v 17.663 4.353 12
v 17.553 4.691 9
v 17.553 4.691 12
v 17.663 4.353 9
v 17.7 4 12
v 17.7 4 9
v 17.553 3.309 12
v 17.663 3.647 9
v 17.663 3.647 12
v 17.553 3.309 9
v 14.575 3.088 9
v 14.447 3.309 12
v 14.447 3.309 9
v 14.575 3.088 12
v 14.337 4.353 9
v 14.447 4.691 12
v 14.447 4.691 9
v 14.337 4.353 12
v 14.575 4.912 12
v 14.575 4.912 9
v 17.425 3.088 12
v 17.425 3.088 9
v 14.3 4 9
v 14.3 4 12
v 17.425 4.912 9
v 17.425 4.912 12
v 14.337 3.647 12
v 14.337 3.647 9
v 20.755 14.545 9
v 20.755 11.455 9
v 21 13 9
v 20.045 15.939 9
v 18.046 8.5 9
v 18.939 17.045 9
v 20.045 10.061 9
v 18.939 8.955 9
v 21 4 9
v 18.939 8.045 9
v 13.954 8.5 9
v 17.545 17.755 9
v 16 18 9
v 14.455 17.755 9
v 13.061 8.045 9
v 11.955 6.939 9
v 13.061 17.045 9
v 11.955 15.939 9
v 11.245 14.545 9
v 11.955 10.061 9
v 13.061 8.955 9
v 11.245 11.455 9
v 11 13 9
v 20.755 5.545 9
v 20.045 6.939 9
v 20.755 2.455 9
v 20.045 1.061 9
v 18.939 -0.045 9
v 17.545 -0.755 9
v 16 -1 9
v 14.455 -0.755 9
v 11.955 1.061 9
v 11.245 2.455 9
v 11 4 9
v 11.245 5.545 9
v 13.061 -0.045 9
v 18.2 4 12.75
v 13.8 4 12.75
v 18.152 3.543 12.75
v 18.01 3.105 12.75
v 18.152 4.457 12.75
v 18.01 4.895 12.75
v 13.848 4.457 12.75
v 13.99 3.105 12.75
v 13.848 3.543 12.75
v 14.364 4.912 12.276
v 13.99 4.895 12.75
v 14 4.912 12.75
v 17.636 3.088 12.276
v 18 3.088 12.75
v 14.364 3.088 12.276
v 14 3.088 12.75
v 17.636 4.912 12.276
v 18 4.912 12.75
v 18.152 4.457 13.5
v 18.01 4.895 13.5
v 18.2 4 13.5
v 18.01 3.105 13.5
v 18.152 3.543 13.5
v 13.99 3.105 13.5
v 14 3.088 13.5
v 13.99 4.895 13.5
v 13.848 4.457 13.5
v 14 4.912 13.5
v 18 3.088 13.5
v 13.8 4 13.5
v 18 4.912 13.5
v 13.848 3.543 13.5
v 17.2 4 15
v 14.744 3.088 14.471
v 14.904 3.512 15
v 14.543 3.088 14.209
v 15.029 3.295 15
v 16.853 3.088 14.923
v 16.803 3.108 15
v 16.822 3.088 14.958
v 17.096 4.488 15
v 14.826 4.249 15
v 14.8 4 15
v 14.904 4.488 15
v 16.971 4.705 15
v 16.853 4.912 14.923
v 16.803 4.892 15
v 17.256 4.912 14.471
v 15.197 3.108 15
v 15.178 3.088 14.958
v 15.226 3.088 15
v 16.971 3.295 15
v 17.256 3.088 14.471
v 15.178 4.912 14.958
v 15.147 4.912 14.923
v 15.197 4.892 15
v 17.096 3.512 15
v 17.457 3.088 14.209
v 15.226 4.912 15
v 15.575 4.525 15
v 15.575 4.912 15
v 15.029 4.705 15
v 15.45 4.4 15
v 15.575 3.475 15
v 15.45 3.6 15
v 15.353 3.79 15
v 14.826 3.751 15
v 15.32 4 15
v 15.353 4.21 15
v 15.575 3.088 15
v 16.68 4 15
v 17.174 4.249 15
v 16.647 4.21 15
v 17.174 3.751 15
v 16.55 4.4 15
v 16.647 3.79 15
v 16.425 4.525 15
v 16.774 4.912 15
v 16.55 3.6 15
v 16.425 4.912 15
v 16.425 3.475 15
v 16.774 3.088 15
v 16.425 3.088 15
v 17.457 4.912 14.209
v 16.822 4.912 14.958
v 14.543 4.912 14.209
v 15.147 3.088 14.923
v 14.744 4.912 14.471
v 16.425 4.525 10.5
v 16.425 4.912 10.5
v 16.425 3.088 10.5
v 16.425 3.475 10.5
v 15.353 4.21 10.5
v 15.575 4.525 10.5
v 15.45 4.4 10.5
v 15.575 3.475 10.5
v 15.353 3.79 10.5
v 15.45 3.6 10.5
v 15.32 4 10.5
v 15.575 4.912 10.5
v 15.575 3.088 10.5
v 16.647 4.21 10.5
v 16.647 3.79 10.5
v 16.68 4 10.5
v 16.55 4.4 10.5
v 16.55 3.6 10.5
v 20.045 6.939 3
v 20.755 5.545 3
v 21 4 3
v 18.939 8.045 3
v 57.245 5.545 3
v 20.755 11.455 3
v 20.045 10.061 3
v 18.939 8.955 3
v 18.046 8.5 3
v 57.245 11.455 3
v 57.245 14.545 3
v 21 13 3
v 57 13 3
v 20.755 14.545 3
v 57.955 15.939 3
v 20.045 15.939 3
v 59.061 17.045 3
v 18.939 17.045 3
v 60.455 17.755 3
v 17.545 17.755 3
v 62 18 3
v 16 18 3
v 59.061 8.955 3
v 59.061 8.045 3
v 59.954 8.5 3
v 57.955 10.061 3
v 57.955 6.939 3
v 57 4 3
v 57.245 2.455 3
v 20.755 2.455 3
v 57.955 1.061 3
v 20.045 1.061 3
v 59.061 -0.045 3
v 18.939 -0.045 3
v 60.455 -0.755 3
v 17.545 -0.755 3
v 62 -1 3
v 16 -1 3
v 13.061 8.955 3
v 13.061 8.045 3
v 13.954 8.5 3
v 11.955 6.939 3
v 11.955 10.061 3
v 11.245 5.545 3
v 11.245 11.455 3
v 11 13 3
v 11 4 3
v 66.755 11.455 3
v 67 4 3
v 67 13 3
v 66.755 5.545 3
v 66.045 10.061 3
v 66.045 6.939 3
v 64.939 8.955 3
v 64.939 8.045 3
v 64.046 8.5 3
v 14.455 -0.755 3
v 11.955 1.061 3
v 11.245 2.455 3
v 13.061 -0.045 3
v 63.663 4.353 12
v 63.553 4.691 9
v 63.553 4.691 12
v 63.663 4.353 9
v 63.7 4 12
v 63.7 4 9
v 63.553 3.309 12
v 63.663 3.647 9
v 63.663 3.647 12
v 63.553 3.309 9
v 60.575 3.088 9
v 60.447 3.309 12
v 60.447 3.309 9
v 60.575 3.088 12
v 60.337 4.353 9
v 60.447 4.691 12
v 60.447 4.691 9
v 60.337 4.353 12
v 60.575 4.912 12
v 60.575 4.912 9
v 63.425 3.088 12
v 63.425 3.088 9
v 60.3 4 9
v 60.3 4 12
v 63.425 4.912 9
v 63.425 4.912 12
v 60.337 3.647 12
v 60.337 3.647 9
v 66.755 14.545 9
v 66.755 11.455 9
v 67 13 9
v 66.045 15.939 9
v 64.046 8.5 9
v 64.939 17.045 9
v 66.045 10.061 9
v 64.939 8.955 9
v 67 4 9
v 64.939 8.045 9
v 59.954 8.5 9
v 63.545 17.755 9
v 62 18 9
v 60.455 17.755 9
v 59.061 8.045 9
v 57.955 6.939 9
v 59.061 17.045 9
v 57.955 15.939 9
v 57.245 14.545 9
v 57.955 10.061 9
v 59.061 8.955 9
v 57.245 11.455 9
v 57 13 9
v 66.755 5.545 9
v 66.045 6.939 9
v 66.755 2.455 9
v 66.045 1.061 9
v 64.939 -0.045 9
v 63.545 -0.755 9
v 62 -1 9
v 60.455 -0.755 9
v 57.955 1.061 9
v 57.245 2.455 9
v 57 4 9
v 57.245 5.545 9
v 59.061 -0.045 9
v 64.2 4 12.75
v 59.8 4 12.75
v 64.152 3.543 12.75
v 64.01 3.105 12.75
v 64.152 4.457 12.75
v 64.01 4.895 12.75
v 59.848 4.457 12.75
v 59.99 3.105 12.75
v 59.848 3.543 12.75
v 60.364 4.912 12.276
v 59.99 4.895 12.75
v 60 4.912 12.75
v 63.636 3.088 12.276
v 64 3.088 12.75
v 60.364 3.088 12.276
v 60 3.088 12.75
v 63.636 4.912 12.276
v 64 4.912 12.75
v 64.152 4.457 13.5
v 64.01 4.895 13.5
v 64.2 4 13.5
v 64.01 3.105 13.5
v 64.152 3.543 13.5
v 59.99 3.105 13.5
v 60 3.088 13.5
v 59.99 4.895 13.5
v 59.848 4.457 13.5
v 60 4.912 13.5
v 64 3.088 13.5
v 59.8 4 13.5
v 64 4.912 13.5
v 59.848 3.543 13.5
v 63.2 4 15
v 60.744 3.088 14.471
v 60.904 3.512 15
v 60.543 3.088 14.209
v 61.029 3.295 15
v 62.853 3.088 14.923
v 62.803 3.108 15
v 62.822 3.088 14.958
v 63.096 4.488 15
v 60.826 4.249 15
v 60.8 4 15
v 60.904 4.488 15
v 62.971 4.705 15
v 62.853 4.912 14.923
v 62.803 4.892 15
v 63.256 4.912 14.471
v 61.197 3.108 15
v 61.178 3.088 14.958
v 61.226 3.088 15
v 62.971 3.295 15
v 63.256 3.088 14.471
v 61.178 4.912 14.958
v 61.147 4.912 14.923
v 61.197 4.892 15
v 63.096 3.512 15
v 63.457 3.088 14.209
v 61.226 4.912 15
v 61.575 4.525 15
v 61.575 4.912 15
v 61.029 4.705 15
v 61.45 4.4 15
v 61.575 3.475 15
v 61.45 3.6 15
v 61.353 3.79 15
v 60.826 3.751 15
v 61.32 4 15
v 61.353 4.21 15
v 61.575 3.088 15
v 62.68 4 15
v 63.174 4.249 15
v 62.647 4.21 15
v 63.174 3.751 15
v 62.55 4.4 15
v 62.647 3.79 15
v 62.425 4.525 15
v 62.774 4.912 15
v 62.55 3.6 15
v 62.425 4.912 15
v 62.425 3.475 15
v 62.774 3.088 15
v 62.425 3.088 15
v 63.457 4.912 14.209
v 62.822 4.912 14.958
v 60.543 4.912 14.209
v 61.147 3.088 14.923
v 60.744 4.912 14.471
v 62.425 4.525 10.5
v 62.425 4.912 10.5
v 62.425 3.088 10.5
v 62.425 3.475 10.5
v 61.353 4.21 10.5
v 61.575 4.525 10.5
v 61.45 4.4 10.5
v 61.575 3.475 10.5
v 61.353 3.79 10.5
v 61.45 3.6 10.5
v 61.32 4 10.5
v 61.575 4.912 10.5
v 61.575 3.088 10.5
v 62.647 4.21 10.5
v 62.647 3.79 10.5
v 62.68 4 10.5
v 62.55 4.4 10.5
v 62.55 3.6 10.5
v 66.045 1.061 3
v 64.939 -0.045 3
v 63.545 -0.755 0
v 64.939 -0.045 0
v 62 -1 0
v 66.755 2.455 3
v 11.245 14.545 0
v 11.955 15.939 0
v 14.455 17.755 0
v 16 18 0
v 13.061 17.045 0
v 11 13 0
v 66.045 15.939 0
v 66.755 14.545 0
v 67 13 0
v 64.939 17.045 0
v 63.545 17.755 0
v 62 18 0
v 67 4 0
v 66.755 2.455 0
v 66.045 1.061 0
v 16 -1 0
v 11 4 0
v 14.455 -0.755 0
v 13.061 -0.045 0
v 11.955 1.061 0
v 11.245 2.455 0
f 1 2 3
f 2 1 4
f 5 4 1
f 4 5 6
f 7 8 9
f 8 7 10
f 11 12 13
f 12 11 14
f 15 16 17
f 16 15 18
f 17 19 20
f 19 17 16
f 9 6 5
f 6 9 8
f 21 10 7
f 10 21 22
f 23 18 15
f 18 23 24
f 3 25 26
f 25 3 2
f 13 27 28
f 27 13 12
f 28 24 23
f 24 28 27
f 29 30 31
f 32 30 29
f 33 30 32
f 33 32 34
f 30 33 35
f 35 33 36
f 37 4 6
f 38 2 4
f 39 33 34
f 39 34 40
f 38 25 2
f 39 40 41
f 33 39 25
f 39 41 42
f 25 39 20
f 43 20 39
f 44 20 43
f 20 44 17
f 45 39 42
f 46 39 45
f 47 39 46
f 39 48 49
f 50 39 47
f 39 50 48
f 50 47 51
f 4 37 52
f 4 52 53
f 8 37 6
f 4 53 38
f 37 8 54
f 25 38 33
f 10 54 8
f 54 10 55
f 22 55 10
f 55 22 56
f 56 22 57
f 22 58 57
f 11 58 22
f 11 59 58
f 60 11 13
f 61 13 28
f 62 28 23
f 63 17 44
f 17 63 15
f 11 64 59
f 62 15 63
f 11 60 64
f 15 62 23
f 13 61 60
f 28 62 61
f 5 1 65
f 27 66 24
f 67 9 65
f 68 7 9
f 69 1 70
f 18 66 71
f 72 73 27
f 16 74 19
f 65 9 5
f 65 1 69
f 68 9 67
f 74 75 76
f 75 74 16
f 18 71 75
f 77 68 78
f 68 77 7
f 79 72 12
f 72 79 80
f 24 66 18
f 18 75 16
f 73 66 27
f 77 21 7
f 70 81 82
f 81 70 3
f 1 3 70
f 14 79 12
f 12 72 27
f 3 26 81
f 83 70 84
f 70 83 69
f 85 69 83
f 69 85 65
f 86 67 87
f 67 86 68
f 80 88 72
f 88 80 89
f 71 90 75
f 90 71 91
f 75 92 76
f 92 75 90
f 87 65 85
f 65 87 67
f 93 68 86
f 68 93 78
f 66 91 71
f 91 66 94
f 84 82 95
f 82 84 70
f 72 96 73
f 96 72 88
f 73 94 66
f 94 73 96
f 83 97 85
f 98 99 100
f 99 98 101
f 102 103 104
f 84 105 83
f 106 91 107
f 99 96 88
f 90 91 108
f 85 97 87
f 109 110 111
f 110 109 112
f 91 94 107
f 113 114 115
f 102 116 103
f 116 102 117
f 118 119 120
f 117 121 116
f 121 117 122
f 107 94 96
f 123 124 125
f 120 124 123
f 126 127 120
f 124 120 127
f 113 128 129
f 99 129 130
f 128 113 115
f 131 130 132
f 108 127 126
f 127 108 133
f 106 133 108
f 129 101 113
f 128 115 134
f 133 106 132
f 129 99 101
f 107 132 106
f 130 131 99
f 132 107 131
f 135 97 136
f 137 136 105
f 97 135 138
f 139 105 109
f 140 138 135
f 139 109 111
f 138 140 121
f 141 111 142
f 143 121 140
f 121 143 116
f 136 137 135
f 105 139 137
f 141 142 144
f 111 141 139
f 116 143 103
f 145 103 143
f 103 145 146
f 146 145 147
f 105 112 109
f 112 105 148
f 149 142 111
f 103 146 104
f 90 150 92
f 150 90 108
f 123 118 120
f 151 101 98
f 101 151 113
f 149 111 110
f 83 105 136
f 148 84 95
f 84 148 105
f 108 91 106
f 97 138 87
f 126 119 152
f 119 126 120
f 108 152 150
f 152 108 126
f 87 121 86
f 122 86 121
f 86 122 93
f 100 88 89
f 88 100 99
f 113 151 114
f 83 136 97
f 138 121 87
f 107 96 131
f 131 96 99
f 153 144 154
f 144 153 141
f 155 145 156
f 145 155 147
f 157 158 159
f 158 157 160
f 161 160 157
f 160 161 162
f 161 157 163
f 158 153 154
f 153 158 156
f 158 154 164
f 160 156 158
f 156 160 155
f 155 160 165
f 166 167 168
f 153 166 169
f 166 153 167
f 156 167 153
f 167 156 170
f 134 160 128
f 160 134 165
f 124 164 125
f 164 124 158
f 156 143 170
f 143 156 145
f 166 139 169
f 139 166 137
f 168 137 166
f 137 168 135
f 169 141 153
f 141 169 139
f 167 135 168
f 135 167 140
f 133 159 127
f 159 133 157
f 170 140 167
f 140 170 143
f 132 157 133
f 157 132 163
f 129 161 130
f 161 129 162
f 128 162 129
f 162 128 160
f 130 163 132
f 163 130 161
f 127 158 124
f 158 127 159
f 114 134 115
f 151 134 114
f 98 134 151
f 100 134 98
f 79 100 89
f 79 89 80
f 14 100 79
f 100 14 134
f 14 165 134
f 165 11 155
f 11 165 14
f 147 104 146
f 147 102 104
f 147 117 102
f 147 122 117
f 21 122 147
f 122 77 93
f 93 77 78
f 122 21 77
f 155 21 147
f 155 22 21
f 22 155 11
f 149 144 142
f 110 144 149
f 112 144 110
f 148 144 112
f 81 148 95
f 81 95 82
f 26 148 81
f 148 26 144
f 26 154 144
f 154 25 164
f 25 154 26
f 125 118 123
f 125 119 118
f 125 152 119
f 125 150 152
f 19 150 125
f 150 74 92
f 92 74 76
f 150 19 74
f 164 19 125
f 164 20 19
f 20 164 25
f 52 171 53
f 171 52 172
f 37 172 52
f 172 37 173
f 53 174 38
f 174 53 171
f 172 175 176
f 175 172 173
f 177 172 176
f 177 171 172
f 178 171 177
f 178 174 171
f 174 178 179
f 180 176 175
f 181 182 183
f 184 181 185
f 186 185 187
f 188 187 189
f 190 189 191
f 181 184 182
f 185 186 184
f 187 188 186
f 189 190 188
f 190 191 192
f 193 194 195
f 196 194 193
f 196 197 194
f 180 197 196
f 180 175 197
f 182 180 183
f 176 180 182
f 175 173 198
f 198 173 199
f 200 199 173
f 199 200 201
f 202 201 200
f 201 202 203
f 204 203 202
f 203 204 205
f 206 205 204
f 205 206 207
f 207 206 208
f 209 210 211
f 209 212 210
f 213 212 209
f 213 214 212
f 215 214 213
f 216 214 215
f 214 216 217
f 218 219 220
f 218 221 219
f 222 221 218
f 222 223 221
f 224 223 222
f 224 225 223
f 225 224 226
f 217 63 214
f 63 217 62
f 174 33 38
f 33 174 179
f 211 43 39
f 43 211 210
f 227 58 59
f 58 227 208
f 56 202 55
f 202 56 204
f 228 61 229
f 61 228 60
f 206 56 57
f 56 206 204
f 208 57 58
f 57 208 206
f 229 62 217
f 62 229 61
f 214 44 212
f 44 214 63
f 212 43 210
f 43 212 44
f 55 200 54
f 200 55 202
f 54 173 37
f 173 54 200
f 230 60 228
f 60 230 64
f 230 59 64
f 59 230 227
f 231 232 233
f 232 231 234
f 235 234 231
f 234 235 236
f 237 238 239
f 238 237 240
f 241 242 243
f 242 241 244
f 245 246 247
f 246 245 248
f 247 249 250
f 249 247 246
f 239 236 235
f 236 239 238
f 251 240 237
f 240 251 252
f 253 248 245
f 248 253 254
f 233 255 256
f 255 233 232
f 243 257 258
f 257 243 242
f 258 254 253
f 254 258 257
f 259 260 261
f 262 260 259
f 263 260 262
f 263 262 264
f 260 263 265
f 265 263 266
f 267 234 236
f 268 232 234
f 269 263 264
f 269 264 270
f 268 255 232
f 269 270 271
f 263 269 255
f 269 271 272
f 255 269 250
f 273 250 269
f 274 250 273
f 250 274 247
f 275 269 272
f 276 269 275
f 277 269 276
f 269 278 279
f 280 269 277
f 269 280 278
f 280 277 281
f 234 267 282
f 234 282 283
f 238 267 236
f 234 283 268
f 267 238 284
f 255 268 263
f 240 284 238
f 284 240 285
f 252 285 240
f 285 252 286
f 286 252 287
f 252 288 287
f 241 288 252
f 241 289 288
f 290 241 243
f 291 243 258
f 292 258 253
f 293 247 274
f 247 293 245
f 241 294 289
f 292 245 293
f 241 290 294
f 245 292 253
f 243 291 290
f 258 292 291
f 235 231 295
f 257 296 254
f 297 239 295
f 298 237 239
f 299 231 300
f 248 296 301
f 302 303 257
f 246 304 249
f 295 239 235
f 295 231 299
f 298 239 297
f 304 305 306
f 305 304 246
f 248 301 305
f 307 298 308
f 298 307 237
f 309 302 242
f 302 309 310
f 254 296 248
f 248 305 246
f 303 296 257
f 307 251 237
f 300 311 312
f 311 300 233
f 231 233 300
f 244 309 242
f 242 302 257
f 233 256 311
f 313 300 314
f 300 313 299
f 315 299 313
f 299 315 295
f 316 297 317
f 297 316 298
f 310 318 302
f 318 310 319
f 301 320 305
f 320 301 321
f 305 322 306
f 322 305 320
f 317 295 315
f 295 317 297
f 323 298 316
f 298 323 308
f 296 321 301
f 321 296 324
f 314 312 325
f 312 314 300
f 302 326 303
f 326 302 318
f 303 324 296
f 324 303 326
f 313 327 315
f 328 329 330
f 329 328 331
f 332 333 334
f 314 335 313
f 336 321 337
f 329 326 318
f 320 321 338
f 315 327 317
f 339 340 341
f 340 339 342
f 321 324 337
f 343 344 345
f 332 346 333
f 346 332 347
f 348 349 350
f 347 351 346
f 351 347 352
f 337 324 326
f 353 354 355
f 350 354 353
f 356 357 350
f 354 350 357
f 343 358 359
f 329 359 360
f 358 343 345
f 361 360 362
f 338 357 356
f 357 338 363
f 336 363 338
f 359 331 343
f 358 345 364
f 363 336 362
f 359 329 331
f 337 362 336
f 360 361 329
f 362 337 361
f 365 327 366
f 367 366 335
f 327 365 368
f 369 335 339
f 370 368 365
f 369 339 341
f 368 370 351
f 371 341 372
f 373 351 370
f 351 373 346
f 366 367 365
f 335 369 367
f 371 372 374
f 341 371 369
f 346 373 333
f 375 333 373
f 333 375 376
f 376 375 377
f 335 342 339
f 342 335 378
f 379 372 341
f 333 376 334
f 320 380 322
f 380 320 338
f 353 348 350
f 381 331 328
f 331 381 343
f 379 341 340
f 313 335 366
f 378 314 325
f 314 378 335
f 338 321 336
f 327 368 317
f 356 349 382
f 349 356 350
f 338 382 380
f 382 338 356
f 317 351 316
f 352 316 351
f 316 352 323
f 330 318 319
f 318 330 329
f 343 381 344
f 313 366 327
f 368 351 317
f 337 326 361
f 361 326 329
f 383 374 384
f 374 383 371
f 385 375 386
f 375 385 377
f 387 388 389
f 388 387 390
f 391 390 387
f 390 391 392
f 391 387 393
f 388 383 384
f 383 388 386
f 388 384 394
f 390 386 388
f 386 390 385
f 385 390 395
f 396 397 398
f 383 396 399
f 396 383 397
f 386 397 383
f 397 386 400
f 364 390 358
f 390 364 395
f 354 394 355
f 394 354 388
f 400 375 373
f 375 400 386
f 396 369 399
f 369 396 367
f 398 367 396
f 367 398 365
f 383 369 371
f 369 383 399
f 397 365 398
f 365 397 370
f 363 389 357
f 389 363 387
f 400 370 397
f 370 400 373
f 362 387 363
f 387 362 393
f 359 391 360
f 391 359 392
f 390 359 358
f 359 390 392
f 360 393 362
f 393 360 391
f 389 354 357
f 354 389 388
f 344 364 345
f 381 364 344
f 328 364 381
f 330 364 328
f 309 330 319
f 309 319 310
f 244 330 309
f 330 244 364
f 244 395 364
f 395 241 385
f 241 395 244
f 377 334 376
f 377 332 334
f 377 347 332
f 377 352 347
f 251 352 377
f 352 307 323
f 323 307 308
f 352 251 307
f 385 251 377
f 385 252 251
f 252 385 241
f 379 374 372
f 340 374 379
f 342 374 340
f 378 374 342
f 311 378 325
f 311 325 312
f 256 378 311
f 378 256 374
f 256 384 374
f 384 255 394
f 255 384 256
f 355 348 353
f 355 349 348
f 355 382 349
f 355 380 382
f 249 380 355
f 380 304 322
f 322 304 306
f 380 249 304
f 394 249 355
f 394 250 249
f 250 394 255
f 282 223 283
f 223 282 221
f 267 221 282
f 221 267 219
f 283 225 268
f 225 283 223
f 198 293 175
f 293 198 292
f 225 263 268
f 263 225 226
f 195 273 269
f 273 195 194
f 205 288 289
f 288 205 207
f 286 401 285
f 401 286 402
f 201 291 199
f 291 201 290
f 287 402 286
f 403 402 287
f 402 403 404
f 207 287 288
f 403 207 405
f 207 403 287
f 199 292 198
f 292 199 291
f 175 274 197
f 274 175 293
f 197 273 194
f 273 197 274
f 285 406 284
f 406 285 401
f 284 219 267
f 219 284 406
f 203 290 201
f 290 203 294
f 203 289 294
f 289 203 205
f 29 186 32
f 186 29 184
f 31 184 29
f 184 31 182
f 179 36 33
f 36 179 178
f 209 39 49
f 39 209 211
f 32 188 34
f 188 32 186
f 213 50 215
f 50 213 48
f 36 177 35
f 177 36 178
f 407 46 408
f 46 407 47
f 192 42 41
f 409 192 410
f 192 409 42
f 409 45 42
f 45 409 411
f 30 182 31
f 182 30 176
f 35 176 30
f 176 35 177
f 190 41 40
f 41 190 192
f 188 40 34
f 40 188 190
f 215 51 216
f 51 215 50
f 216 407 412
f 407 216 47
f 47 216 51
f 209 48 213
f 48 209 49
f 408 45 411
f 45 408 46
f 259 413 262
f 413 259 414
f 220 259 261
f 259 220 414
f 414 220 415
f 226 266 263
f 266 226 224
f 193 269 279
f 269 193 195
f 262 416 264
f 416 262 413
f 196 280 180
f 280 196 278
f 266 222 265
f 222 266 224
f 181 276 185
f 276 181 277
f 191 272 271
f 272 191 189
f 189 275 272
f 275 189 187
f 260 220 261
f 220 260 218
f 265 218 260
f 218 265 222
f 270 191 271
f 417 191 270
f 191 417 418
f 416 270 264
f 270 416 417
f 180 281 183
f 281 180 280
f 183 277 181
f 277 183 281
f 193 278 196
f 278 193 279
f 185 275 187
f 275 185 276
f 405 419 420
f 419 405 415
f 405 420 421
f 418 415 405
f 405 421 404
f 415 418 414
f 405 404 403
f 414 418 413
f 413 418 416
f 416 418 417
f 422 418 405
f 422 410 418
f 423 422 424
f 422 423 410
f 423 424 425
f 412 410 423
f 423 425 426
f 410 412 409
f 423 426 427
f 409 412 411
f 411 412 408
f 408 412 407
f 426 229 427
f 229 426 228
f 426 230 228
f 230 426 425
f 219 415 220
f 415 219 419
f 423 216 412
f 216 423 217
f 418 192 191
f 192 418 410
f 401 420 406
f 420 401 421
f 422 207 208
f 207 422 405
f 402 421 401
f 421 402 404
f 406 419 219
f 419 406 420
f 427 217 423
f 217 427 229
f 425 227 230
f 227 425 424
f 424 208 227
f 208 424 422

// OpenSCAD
// dimensions
x = 76;
y = 17;
z = 3.0;

//radii pins
r = 1.7;
R = 4;

//cube([x,y,z]);
$fn=20;

y_off = 4;
baseh = 3;
bh =6;
br = 5;
ph = 6;
//pin 1
x_off = 16;
translate([x_off,y_off, z]) pintack(h=ph, r=r, bh=bh, br=br);
translate([x_off,y - y_off, z]) cylinder(r=br,h=bh);

//pin2
x_off2 = 62;
translate([x_off2,y_off, z]) pintack(h=ph, r=r, bh=bh, br=br);
translate([x_off2,y - y_off, z]) cylinder(r=br,h=bh);


hull(){
//pin1
translate([x_off,y_off, 0]) cylinder(h=baseh, r=br);
translate([x_off,y - y_off, 0]) cylinder(r=br,h=baseh);
//pin2
translate([x_off2,y_off, 0]) cylinder(h=baseh, r=br);
translate([x_off2,y - y_off, 0]) cylinder(r=br,h=baseh);
    
}


module pin(h=10, r=4, lh=3, lt=1, side=false) {
  // h = shaft height
  // r = shaft radius
  // lh = lip height
  // lt = lip thickness
  // side = set to true if you want it printed horizontally

  if (side) {
    pin_horizontal(h, r, lh, lt);
  } else {
    pin_vertical(h, r, lh, lt);
  }
}

module pintack(h=10, r=4, lh=3, lt=1, bh=3, br=8.75) {
  // bh = base_height
  // br = base_radius
  
  union() {
    cylinder(h=bh, r=br);
    translate([0, 0, bh]) pin(h, r, lh, lt);
  }
}


// just call pin instead, I made this module because it was easier to do the rotation option this way
// since openscad complains of recursion if I did it all in one module
module pin_vertical(h=10, r=4, lh=3, lt=1) {
  // h = shaft height
  // r = shaft radius
  // lh = lip height
  // lt = lip thickness

  difference() {
    pin_solid(h, r, lh, lt);
    
    // center cut
    translate([-r*0.5/2, -(r*2+lt*2)/2, h/4]) cube([r*0.5, r*2+lt*2, h]);
    translate([0, 0, h/4]) cylinder(h=h+lh, r=r/2.5, $fn=20);
    // center curve
    // translate([0, 0, h/4]) rotate([90, 0, 0]) cylinder(h=r*2, r=r*0.5/2, center=true, $fn=20);
  
    // side cuts
    translate([-r*2, -lt-r*1.125, -1]) cube([r*4, lt*2, h+2]);
    translate([-r*2, -lt+r*1.125, -1]) cube([r*4, lt*2, h+2]);
  }
}

// call pin with side=true instead of this
module pin_horizontal(h=10, r=4, lh=3, lt=1) {
  // h = shaft height
  // r = shaft radius
  // lh = lip height
  // lt = lip thickness
  translate([0, h/2, r*1.125-lt]) rotate([90, 0, 0]) pin_vertical(h, r, lh, lt);
}

// this is mainly to make the pinhole module easier
module pin_solid(h=10, r=4, lh=3, lt=1) {
  union() {
    // shaft
    cylinder(h=h-lh, r=r, $fn=30);
    // lip
    // translate([0, 0, h-lh]) cylinder(h=lh*0.25, r1=r, r2=r+(lt/2), $fn=30);
    // translate([0, 0, h-lh+lh*0.25]) cylinder(h=lh*0.25, r2=r, r1=r+(lt/2), $fn=30);
    // translate([0, 0, h-lh+lh*0.50]) cylinder(h=lh*0.50, r1=r, r2=r-(lt/2), $fn=30);

    // translate([0, 0, h-lh]) cylinder(h=lh*0.50, r1=r, r2=r+(lt/2), $fn=30);
    // translate([0, 0, h-lh+lh*0.50]) cylinder(h=lh*0.50, r1=r+(lt/2), r2=r-(lt/3), $fn=30);    

    translate([0, 0, h-lh]) cylinder(h=lh*0.25, r1=r, r2=r+(lt/2), $fn=30);
    translate([0, 0, h-lh+lh*0.25]) cylinder(h=lh*0.25, r=r+(lt/2), $fn=30);    
    translate([0, 0, h-lh+lh*0.50]) cylinder(h=lh*0.50, r1=r+(lt/2), r2=r-(lt/2), $fn=30);    

    // translate([0, 0, h-lh]) cylinder(h=lh, r1=r+(lt/2), r2=1, $fn=30);
    // translate([0, 0, h-lh-lt/2]) cylinder(h=lt/2, r1=r, r2=r+(lt/2), $fn=30);
  }
}
